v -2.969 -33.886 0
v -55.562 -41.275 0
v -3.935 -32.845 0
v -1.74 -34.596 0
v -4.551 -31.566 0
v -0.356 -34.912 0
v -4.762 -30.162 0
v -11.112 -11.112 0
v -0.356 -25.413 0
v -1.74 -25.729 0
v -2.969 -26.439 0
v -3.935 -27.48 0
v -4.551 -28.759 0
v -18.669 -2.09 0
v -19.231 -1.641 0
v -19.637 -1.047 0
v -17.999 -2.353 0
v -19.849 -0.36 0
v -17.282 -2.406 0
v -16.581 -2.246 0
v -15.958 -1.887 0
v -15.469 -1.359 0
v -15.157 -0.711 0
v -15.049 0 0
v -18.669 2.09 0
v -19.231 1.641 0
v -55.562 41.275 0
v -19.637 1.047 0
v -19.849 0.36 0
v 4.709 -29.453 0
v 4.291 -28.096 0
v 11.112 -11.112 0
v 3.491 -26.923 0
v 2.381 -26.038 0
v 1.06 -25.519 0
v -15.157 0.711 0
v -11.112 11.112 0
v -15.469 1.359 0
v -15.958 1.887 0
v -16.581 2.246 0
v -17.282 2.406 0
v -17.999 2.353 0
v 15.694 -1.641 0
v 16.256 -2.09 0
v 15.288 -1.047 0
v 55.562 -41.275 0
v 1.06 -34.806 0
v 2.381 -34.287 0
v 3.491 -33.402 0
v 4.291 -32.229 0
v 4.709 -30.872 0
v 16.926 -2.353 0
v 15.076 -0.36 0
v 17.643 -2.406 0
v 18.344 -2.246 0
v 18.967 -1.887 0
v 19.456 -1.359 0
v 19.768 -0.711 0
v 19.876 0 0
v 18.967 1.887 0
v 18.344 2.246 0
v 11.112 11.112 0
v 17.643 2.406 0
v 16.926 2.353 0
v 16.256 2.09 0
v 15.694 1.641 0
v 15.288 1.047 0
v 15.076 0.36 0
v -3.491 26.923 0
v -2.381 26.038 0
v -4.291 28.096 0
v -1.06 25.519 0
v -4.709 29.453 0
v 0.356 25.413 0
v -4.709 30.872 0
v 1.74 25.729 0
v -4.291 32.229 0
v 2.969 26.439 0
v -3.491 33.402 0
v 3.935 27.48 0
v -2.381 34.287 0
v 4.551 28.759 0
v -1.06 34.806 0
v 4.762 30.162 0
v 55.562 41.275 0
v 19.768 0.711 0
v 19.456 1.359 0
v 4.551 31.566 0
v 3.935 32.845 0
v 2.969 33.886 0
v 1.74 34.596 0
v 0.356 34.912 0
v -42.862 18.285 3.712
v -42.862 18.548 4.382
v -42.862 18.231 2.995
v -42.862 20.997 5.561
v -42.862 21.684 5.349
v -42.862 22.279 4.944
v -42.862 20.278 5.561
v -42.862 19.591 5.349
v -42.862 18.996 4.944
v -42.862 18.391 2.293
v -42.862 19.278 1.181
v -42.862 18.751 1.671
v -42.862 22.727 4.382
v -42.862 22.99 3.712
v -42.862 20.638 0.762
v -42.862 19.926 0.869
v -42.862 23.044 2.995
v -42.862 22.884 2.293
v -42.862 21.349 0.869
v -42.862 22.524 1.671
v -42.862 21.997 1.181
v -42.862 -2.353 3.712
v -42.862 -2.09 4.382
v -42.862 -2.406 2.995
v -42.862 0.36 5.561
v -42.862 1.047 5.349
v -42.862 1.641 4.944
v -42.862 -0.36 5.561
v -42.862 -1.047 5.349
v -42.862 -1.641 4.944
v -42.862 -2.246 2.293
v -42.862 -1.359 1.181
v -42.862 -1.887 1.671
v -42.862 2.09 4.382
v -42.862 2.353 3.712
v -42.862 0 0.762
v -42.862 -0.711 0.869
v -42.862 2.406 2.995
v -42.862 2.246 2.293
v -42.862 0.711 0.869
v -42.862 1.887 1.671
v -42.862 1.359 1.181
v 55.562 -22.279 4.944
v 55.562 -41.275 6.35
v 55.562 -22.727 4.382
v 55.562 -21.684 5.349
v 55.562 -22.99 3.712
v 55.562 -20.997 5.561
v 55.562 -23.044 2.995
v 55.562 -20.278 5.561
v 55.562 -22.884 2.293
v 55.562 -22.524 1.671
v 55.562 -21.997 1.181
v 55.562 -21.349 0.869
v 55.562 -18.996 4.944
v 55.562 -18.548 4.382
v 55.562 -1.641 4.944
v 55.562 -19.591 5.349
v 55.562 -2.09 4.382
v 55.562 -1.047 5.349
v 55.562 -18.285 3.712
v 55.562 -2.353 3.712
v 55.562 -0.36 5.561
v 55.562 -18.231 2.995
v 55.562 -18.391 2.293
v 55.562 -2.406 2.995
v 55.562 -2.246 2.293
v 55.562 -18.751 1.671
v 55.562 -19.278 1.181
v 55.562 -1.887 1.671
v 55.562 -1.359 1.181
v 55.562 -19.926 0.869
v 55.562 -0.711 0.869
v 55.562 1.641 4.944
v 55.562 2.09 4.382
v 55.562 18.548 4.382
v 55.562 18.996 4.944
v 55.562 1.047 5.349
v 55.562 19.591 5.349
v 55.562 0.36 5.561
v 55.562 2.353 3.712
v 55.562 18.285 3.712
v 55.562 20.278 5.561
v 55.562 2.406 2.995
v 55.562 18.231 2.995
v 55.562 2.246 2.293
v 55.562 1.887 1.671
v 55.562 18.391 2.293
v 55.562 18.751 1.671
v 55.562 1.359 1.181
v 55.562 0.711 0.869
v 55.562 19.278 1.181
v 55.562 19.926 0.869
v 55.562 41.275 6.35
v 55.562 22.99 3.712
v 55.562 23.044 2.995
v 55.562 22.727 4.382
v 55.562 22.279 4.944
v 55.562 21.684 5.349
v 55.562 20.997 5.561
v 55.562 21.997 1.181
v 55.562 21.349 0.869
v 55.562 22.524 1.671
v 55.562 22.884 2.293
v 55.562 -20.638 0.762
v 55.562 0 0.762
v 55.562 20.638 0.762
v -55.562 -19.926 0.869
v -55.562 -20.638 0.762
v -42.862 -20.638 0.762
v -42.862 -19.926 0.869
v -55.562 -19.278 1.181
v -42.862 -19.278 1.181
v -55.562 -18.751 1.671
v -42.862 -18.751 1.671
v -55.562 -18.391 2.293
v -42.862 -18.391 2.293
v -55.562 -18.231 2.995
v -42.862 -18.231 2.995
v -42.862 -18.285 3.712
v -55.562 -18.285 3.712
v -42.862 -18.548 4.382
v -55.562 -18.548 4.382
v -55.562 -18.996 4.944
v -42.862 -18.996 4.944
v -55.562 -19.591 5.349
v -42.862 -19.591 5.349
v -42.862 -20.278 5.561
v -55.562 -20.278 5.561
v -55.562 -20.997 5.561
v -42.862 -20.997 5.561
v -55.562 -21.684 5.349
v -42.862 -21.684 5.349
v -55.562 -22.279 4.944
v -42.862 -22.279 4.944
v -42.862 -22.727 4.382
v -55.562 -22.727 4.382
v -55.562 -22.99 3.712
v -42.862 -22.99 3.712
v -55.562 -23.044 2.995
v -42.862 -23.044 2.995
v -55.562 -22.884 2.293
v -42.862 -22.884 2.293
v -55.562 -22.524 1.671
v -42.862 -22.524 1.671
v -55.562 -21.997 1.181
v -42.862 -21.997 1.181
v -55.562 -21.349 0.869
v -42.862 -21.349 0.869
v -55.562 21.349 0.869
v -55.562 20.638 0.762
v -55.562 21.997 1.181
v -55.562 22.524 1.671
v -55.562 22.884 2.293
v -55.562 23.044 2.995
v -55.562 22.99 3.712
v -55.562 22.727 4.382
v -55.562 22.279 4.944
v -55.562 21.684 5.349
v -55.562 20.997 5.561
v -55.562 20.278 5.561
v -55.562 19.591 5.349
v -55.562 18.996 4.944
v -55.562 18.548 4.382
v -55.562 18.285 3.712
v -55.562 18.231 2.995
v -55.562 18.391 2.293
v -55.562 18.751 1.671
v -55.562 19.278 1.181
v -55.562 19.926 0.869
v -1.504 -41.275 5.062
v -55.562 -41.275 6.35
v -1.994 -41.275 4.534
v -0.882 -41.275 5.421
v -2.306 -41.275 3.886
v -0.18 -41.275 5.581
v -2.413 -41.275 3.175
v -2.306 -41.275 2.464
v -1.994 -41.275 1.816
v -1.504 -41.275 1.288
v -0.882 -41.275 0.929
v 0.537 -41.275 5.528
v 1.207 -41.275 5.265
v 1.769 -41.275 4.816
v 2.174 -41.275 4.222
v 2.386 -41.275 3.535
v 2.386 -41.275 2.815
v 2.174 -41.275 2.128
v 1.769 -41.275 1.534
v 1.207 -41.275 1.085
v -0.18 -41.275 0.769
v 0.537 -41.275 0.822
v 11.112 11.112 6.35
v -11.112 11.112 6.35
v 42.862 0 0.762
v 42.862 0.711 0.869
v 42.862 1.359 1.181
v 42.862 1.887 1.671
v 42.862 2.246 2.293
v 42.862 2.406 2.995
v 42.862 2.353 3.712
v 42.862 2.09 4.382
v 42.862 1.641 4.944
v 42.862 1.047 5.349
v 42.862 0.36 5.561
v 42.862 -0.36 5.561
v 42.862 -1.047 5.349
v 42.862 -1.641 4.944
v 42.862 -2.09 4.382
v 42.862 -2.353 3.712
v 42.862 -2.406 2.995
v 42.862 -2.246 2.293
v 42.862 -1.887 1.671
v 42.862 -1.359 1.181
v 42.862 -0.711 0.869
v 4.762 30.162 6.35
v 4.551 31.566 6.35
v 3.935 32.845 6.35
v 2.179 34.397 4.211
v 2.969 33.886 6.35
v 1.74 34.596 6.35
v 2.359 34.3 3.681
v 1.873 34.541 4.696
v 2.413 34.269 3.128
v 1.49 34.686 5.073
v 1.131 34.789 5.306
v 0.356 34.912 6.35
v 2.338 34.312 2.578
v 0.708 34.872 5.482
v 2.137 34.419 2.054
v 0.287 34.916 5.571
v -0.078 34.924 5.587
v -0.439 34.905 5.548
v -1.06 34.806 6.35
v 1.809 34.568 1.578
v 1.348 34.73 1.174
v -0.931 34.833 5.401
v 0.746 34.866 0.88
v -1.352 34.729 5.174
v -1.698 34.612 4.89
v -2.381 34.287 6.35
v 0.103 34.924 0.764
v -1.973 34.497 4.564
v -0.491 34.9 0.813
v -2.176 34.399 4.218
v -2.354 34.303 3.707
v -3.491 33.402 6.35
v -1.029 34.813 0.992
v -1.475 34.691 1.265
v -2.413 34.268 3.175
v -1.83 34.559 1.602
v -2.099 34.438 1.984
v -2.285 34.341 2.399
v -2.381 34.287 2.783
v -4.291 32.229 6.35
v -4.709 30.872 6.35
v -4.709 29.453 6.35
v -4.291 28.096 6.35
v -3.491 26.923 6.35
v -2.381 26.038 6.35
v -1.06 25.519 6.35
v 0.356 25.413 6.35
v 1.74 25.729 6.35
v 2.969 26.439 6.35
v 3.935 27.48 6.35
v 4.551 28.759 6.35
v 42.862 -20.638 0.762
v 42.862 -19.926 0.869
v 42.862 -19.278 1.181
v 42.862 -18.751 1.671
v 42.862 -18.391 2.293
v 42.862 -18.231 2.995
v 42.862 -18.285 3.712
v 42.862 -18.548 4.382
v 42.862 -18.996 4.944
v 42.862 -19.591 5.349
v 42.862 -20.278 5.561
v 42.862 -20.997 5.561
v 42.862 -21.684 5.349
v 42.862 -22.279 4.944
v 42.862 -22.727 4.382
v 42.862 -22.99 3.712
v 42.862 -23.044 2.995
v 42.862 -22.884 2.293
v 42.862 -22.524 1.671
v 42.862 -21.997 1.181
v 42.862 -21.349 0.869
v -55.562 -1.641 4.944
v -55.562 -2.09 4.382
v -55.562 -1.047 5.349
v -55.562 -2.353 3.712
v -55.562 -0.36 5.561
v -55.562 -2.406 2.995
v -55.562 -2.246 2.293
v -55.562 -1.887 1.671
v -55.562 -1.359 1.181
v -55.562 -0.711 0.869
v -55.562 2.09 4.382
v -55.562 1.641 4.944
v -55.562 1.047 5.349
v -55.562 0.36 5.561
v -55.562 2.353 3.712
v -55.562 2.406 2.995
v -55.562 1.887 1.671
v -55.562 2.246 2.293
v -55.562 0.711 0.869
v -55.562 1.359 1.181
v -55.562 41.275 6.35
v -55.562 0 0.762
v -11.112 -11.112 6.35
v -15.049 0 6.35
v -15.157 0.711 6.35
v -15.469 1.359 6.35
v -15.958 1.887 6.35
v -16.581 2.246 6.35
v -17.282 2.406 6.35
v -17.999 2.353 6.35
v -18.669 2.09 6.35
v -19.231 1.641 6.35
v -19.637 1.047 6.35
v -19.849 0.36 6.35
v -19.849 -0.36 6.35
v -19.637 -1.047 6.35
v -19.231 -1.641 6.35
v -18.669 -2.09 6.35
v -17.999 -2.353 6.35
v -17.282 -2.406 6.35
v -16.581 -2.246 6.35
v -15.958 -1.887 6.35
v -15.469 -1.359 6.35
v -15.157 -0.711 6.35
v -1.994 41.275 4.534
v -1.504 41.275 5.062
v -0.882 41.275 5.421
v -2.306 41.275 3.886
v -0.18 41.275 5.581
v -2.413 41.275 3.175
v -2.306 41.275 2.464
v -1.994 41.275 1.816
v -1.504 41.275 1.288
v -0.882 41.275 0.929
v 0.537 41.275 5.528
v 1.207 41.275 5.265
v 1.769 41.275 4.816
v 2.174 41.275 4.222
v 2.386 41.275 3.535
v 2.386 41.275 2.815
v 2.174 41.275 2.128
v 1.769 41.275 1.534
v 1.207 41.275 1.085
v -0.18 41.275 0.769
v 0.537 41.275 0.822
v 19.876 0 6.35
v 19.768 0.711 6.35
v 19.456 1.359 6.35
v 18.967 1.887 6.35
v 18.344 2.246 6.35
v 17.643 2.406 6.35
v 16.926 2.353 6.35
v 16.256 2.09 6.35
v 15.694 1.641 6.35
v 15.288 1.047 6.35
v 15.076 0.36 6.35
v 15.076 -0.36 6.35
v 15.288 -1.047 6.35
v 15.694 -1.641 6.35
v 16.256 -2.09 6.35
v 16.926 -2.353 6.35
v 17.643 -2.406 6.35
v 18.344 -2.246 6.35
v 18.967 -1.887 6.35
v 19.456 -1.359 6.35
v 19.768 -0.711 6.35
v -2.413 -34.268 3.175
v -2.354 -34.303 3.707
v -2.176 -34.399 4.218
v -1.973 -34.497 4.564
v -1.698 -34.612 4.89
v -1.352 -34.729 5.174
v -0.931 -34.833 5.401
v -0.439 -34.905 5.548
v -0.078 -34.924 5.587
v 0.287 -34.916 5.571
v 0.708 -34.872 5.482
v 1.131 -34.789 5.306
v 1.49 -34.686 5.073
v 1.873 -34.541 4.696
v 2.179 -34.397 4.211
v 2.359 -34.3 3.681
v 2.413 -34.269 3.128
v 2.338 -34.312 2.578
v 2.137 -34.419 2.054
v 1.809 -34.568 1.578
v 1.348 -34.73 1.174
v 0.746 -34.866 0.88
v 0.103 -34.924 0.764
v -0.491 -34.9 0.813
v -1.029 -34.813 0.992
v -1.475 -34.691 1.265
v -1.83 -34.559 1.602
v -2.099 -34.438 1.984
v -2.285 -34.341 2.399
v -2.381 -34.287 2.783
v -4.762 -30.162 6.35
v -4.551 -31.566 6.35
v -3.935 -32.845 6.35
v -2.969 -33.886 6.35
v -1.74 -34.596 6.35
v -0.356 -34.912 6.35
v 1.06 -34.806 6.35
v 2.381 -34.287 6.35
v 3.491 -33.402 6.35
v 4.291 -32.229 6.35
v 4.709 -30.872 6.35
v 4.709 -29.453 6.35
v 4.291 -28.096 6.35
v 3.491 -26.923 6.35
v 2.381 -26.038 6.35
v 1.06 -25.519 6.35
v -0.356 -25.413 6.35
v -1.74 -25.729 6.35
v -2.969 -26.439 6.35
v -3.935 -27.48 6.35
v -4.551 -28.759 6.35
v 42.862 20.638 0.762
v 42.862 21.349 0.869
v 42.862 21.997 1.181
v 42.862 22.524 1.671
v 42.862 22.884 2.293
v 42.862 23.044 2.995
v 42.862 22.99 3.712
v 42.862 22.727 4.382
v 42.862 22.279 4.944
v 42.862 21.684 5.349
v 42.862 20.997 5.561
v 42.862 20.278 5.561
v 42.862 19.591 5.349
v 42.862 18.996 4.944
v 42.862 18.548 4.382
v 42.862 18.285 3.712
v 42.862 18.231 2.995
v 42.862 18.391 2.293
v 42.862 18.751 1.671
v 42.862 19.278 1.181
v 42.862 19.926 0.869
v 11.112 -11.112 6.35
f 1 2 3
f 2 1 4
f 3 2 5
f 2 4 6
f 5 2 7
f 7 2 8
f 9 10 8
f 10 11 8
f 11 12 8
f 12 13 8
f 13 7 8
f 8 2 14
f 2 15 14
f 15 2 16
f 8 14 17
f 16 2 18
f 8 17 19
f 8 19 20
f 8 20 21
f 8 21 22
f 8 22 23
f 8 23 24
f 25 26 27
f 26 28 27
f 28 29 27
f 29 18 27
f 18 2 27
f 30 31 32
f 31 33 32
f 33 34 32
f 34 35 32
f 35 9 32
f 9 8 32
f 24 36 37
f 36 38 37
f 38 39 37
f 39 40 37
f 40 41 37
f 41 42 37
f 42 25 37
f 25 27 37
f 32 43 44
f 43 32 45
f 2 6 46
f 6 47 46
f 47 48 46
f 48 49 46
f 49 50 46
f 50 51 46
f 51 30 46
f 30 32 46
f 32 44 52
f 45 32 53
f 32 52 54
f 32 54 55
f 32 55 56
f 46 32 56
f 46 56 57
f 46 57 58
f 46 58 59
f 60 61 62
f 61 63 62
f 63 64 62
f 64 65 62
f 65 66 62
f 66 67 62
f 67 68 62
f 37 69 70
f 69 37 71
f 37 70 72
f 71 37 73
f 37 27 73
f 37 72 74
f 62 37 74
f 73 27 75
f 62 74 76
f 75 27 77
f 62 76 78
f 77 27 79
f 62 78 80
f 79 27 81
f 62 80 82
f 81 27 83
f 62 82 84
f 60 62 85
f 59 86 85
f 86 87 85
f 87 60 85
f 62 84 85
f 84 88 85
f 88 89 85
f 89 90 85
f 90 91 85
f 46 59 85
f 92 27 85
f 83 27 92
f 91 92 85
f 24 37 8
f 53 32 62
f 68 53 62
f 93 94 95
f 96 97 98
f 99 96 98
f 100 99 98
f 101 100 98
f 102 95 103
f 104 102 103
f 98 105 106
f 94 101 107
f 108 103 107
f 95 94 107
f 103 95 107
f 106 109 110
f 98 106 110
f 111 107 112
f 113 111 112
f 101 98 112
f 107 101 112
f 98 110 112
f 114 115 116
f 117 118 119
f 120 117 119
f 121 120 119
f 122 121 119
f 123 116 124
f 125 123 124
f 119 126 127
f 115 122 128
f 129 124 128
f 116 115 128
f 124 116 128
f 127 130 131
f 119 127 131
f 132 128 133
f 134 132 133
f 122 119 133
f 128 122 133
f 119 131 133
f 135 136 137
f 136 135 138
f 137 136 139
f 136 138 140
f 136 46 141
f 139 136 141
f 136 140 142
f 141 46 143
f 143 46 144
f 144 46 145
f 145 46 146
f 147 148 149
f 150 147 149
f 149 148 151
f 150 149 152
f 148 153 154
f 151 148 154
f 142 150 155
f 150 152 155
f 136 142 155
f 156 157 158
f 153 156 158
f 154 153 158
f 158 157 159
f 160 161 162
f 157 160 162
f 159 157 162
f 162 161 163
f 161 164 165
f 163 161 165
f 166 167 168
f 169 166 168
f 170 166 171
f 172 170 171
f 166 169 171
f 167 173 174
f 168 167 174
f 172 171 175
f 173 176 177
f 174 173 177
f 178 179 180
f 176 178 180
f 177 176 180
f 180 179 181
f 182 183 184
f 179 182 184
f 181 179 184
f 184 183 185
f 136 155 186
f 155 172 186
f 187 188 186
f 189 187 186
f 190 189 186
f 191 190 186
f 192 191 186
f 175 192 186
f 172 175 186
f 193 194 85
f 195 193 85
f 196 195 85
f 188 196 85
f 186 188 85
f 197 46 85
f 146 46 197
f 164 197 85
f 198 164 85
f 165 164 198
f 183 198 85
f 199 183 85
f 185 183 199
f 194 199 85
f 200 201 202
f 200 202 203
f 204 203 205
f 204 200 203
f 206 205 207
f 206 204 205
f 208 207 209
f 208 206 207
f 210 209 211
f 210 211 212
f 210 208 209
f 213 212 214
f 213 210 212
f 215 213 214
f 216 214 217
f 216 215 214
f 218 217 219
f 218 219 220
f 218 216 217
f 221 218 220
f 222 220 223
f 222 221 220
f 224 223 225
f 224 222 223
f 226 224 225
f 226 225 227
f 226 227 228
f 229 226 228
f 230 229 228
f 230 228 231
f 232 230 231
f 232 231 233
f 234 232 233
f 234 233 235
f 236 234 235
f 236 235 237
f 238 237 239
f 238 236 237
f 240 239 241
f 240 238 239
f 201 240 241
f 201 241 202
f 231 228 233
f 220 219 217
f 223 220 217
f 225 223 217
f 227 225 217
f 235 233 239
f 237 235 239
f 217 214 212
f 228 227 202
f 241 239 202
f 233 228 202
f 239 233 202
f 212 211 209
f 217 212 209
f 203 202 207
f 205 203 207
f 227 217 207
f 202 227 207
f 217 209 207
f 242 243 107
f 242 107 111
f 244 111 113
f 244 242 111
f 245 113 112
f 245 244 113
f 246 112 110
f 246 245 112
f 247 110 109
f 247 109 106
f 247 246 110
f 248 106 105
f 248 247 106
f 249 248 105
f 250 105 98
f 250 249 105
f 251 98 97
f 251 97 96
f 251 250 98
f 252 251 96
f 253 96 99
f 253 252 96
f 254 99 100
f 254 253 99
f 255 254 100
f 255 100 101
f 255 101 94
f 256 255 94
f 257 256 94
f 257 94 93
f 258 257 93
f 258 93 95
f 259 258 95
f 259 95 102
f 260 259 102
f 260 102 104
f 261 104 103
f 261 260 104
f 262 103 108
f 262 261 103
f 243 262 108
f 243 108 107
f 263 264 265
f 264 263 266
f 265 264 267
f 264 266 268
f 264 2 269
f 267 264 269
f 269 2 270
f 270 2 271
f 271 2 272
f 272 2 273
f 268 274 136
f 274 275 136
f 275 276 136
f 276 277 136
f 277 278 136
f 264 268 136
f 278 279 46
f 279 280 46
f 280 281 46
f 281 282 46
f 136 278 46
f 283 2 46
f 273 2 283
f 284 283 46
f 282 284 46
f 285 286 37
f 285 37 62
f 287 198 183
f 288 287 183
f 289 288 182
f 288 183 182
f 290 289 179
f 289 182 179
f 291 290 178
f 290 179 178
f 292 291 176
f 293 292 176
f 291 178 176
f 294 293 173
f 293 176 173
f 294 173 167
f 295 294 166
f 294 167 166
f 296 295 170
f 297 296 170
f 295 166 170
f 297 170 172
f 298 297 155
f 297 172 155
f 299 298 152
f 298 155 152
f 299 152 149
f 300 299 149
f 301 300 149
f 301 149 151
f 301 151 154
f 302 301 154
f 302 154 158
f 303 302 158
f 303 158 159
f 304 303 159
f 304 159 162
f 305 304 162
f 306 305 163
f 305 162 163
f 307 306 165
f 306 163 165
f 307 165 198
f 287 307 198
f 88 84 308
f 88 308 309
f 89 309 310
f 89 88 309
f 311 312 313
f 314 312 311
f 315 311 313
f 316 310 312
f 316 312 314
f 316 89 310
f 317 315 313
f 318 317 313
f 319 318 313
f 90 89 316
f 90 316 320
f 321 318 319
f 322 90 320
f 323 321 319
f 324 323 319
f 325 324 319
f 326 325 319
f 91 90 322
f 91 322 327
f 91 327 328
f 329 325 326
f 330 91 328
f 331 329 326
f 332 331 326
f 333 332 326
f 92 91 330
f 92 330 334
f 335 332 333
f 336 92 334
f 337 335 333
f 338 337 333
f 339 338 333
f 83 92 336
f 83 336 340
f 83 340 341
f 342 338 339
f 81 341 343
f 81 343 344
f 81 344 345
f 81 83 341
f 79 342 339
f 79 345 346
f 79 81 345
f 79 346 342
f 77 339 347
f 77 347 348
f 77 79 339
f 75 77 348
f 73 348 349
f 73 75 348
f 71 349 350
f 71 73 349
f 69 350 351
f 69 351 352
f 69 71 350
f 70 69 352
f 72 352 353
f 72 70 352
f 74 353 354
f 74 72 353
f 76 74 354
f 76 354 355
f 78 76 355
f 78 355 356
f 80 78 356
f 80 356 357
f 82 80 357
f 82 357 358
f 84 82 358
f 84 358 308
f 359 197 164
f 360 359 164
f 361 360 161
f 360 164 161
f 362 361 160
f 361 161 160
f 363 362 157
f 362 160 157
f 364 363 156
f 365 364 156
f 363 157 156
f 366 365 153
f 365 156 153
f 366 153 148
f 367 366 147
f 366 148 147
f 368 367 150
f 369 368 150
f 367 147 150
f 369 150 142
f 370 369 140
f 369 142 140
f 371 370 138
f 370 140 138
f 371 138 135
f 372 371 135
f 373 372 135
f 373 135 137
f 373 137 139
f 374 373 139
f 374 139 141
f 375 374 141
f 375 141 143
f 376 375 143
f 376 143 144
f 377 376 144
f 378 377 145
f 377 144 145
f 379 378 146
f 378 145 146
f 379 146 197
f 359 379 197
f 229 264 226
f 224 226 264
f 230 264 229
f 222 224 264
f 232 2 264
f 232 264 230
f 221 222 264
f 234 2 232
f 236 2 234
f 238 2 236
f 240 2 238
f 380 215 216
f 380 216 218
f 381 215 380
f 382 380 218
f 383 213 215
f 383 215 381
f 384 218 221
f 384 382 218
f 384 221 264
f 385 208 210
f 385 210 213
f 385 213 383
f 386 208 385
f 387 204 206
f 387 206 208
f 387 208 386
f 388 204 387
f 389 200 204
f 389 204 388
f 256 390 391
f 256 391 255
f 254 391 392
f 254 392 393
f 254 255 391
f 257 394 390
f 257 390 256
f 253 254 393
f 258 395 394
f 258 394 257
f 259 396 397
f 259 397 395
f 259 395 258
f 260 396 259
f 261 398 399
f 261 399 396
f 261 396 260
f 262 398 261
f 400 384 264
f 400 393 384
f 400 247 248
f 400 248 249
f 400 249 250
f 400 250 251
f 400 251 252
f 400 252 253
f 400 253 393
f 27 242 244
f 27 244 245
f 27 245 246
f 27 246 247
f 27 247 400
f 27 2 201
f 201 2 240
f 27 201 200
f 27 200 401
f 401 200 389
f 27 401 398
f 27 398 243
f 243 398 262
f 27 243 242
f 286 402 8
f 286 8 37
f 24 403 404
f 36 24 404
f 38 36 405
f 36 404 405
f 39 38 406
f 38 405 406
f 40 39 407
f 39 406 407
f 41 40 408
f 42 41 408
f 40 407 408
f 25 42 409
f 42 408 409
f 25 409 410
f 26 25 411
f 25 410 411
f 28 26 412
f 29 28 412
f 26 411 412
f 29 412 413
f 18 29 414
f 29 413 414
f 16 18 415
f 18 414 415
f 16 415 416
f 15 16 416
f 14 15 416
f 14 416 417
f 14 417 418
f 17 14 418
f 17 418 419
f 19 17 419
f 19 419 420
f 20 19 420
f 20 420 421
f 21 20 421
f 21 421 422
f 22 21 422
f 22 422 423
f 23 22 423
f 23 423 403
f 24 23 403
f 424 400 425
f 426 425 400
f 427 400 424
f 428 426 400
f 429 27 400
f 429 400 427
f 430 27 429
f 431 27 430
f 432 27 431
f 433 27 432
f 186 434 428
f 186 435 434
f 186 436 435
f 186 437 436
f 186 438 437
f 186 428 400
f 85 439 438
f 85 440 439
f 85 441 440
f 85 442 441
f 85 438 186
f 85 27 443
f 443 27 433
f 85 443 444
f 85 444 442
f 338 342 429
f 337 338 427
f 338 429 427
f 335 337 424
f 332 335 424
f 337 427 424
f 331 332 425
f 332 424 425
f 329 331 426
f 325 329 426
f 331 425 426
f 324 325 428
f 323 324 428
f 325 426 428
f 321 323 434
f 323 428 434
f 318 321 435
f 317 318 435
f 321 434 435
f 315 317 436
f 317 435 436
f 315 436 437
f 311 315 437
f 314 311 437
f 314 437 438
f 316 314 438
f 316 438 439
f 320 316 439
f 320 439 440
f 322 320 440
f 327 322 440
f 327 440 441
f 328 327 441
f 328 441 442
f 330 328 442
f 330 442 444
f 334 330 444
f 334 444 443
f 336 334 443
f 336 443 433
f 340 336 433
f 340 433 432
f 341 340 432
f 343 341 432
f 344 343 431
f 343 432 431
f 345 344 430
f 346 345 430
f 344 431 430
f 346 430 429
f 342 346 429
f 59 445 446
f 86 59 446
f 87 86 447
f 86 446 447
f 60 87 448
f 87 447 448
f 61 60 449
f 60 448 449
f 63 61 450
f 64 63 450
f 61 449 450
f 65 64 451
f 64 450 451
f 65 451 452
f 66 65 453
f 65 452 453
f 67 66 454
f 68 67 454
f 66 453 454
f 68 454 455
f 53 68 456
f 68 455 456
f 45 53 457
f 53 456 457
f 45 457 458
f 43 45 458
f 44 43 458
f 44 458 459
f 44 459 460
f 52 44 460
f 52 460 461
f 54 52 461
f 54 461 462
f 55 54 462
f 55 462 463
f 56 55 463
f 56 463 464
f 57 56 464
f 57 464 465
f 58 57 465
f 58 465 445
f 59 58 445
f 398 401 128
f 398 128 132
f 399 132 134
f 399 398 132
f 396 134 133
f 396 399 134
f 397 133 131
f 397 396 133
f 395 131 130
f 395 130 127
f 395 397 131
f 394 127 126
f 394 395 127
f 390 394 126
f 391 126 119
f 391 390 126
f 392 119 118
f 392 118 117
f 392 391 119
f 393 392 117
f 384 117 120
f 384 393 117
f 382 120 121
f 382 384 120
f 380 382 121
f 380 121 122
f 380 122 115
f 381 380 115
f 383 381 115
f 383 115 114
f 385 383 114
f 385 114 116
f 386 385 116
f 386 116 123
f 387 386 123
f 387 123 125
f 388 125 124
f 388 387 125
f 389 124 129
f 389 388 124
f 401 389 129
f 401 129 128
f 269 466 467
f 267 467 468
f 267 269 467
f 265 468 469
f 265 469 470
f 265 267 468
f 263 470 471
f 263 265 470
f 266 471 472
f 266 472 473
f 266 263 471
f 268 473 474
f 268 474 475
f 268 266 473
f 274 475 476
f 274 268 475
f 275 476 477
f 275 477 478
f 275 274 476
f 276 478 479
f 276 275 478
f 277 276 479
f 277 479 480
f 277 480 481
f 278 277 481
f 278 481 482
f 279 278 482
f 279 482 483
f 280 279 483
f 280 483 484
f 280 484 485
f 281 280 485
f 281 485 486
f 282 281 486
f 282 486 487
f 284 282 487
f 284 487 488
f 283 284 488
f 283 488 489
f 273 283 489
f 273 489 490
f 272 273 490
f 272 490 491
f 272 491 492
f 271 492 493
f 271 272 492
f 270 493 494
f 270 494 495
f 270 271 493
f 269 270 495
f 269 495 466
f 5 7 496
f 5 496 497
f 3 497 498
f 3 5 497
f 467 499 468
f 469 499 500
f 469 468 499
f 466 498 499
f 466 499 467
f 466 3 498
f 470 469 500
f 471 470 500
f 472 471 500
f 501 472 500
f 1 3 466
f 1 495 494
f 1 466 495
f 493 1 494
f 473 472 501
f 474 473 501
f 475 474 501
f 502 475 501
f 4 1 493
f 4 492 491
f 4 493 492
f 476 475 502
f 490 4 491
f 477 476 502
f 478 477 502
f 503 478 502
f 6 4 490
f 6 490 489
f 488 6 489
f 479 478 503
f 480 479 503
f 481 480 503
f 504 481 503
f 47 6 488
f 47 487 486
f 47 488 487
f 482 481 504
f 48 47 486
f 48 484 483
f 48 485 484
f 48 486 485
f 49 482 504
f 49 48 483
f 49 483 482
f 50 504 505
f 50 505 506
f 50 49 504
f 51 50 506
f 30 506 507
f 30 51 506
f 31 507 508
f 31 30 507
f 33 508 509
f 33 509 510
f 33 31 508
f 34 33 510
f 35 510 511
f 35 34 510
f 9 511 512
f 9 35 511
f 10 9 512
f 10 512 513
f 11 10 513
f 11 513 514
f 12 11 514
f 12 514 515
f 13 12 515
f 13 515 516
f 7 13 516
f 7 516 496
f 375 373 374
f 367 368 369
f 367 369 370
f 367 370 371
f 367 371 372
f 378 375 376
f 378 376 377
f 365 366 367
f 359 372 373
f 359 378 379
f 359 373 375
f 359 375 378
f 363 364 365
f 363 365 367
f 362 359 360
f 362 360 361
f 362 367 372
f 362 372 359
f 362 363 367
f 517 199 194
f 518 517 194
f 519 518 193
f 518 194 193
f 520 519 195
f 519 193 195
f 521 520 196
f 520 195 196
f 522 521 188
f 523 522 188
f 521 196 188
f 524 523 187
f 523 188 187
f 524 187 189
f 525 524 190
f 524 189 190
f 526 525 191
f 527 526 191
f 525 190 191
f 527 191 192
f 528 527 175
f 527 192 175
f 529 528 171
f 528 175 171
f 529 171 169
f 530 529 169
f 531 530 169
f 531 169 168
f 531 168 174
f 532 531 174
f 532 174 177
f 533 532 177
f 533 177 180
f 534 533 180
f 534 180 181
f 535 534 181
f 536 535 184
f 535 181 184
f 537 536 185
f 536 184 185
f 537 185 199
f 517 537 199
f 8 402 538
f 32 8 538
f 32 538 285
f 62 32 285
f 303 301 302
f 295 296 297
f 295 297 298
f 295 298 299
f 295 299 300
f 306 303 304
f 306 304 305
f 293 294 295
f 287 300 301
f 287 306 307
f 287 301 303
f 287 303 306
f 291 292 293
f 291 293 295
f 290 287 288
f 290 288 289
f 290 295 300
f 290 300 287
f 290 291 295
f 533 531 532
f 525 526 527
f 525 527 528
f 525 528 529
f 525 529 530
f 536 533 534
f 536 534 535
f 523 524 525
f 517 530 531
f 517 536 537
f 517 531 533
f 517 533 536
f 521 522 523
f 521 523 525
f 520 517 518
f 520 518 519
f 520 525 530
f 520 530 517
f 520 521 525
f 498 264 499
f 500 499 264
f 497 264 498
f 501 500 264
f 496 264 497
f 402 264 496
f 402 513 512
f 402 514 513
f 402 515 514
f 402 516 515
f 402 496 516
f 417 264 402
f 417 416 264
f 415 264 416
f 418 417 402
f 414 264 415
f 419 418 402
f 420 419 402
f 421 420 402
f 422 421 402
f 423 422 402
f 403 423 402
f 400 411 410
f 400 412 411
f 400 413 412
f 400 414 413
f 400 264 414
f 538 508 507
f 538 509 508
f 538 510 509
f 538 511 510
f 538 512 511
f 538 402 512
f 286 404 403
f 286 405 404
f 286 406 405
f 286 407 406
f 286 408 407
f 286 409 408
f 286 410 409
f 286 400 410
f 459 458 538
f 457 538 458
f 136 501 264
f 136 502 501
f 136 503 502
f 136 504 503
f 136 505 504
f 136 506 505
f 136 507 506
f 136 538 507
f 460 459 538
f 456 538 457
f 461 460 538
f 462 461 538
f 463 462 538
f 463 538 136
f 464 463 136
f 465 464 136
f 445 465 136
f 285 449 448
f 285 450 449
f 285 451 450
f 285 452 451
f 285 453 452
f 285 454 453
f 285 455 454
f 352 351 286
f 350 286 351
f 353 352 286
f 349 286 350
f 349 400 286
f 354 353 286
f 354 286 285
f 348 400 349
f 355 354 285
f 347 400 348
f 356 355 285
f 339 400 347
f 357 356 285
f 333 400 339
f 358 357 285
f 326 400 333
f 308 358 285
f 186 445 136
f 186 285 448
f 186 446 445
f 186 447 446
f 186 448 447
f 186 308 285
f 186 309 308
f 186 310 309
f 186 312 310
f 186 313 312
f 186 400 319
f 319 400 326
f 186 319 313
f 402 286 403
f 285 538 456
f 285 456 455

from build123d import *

# Parameters (mm, degrees)
SKETCH1_W           = 111.125
SKETCH1_H           = 82.55
SKETCH1_R           = 4.7625
BOSS_EXTRUDE1_DEPTH = 6.35
SKETCH2_R           = 2.413
CUT_EXTRUDE1_DEPTH  = 12.7
SKETCH3_R           = 2.413
CUT_EXTRUDE2_DEPTH  = 12.7
SKETCH4_R           = 2.413
SKETCH4_W           = 22.225
SKETCH4_H           = 22.225
CUT_EXTRUDE3_DEPTH  = 7.62


with BuildPart() as part:
    # Sketch1 → Boss-Extrude1 (new body)
    with BuildSketch(Plane.XY):
        Rectangle(SKETCH1_W, SKETCH1_H)
        with Locations((0, 30.1625)):
            Circle(SKETCH1_R, mode=Mode.SUBTRACT)
        with Locations(Location((0, -30.1625, 0), (0, 0, 180))):
            Circle(SKETCH1_R, mode=Mode.SUBTRACT)
    extrude(amount=BOSS_EXTRUDE1_DEPTH)

    # Sketch2 → Cut-Extrude1 (cut)
    with BuildSketch(Plane(origin=(55.5625, 0, 0), x_dir=(0, 0, -1), z_dir=(1, 0, 0))):
        with Locations((-3.175, 20.6375)):
            Circle(SKETCH2_R)
        with Locations((-3.175, 0)):
            Circle(SKETCH2_R)
        with Locations((-3.175, -20.6375)):
            Circle(SKETCH2_R)
    cut_extrude1 = extrude(amount=-CUT_EXTRUDE1_DEPTH, mode=Mode.SUBTRACT)

    # Mirror1: Cut-Extrude1 across plane
    add(cut_extrude1.mirror(Plane(origin=(0, 0, 0), x_dir=(0, 0, 1), z_dir=(1, 0, 0))), mode=Mode.SUBTRACT)

    # Sketch3 → Cut-Extrude2 (cut)
    with BuildSketch(Plane(origin=(0, 41.275, 0), x_dir=(1, 0, 0), z_dir=(0, 1, 0))):
        with Locations(Location((0, -3.175, 0), (0, 0, 180))):
            Circle(SKETCH3_R)
    cut_extrude2 = extrude(amount=-CUT_EXTRUDE2_DEPTH, mode=Mode.SUBTRACT)

    # Mirror2: Cut-Extrude2 across plane
    add(cut_extrude2.mirror(Plane.ZX), mode=Mode.SUBTRACT)

    # Sketch4 → Cut-Extrude3 (cut)
    with BuildSketch(Plane.XY.offset(6.35)):
        with Locations((17.4625, 0)):
            Circle(SKETCH4_R)
        with Locations((-17.4625, 0)):
            Circle(SKETCH4_R)
        Rectangle(SKETCH4_W, SKETCH4_H)
    extrude(amount=-CUT_EXTRUDE3_DEPTH, mode=Mode.SUBTRACT)


solid = part.part
